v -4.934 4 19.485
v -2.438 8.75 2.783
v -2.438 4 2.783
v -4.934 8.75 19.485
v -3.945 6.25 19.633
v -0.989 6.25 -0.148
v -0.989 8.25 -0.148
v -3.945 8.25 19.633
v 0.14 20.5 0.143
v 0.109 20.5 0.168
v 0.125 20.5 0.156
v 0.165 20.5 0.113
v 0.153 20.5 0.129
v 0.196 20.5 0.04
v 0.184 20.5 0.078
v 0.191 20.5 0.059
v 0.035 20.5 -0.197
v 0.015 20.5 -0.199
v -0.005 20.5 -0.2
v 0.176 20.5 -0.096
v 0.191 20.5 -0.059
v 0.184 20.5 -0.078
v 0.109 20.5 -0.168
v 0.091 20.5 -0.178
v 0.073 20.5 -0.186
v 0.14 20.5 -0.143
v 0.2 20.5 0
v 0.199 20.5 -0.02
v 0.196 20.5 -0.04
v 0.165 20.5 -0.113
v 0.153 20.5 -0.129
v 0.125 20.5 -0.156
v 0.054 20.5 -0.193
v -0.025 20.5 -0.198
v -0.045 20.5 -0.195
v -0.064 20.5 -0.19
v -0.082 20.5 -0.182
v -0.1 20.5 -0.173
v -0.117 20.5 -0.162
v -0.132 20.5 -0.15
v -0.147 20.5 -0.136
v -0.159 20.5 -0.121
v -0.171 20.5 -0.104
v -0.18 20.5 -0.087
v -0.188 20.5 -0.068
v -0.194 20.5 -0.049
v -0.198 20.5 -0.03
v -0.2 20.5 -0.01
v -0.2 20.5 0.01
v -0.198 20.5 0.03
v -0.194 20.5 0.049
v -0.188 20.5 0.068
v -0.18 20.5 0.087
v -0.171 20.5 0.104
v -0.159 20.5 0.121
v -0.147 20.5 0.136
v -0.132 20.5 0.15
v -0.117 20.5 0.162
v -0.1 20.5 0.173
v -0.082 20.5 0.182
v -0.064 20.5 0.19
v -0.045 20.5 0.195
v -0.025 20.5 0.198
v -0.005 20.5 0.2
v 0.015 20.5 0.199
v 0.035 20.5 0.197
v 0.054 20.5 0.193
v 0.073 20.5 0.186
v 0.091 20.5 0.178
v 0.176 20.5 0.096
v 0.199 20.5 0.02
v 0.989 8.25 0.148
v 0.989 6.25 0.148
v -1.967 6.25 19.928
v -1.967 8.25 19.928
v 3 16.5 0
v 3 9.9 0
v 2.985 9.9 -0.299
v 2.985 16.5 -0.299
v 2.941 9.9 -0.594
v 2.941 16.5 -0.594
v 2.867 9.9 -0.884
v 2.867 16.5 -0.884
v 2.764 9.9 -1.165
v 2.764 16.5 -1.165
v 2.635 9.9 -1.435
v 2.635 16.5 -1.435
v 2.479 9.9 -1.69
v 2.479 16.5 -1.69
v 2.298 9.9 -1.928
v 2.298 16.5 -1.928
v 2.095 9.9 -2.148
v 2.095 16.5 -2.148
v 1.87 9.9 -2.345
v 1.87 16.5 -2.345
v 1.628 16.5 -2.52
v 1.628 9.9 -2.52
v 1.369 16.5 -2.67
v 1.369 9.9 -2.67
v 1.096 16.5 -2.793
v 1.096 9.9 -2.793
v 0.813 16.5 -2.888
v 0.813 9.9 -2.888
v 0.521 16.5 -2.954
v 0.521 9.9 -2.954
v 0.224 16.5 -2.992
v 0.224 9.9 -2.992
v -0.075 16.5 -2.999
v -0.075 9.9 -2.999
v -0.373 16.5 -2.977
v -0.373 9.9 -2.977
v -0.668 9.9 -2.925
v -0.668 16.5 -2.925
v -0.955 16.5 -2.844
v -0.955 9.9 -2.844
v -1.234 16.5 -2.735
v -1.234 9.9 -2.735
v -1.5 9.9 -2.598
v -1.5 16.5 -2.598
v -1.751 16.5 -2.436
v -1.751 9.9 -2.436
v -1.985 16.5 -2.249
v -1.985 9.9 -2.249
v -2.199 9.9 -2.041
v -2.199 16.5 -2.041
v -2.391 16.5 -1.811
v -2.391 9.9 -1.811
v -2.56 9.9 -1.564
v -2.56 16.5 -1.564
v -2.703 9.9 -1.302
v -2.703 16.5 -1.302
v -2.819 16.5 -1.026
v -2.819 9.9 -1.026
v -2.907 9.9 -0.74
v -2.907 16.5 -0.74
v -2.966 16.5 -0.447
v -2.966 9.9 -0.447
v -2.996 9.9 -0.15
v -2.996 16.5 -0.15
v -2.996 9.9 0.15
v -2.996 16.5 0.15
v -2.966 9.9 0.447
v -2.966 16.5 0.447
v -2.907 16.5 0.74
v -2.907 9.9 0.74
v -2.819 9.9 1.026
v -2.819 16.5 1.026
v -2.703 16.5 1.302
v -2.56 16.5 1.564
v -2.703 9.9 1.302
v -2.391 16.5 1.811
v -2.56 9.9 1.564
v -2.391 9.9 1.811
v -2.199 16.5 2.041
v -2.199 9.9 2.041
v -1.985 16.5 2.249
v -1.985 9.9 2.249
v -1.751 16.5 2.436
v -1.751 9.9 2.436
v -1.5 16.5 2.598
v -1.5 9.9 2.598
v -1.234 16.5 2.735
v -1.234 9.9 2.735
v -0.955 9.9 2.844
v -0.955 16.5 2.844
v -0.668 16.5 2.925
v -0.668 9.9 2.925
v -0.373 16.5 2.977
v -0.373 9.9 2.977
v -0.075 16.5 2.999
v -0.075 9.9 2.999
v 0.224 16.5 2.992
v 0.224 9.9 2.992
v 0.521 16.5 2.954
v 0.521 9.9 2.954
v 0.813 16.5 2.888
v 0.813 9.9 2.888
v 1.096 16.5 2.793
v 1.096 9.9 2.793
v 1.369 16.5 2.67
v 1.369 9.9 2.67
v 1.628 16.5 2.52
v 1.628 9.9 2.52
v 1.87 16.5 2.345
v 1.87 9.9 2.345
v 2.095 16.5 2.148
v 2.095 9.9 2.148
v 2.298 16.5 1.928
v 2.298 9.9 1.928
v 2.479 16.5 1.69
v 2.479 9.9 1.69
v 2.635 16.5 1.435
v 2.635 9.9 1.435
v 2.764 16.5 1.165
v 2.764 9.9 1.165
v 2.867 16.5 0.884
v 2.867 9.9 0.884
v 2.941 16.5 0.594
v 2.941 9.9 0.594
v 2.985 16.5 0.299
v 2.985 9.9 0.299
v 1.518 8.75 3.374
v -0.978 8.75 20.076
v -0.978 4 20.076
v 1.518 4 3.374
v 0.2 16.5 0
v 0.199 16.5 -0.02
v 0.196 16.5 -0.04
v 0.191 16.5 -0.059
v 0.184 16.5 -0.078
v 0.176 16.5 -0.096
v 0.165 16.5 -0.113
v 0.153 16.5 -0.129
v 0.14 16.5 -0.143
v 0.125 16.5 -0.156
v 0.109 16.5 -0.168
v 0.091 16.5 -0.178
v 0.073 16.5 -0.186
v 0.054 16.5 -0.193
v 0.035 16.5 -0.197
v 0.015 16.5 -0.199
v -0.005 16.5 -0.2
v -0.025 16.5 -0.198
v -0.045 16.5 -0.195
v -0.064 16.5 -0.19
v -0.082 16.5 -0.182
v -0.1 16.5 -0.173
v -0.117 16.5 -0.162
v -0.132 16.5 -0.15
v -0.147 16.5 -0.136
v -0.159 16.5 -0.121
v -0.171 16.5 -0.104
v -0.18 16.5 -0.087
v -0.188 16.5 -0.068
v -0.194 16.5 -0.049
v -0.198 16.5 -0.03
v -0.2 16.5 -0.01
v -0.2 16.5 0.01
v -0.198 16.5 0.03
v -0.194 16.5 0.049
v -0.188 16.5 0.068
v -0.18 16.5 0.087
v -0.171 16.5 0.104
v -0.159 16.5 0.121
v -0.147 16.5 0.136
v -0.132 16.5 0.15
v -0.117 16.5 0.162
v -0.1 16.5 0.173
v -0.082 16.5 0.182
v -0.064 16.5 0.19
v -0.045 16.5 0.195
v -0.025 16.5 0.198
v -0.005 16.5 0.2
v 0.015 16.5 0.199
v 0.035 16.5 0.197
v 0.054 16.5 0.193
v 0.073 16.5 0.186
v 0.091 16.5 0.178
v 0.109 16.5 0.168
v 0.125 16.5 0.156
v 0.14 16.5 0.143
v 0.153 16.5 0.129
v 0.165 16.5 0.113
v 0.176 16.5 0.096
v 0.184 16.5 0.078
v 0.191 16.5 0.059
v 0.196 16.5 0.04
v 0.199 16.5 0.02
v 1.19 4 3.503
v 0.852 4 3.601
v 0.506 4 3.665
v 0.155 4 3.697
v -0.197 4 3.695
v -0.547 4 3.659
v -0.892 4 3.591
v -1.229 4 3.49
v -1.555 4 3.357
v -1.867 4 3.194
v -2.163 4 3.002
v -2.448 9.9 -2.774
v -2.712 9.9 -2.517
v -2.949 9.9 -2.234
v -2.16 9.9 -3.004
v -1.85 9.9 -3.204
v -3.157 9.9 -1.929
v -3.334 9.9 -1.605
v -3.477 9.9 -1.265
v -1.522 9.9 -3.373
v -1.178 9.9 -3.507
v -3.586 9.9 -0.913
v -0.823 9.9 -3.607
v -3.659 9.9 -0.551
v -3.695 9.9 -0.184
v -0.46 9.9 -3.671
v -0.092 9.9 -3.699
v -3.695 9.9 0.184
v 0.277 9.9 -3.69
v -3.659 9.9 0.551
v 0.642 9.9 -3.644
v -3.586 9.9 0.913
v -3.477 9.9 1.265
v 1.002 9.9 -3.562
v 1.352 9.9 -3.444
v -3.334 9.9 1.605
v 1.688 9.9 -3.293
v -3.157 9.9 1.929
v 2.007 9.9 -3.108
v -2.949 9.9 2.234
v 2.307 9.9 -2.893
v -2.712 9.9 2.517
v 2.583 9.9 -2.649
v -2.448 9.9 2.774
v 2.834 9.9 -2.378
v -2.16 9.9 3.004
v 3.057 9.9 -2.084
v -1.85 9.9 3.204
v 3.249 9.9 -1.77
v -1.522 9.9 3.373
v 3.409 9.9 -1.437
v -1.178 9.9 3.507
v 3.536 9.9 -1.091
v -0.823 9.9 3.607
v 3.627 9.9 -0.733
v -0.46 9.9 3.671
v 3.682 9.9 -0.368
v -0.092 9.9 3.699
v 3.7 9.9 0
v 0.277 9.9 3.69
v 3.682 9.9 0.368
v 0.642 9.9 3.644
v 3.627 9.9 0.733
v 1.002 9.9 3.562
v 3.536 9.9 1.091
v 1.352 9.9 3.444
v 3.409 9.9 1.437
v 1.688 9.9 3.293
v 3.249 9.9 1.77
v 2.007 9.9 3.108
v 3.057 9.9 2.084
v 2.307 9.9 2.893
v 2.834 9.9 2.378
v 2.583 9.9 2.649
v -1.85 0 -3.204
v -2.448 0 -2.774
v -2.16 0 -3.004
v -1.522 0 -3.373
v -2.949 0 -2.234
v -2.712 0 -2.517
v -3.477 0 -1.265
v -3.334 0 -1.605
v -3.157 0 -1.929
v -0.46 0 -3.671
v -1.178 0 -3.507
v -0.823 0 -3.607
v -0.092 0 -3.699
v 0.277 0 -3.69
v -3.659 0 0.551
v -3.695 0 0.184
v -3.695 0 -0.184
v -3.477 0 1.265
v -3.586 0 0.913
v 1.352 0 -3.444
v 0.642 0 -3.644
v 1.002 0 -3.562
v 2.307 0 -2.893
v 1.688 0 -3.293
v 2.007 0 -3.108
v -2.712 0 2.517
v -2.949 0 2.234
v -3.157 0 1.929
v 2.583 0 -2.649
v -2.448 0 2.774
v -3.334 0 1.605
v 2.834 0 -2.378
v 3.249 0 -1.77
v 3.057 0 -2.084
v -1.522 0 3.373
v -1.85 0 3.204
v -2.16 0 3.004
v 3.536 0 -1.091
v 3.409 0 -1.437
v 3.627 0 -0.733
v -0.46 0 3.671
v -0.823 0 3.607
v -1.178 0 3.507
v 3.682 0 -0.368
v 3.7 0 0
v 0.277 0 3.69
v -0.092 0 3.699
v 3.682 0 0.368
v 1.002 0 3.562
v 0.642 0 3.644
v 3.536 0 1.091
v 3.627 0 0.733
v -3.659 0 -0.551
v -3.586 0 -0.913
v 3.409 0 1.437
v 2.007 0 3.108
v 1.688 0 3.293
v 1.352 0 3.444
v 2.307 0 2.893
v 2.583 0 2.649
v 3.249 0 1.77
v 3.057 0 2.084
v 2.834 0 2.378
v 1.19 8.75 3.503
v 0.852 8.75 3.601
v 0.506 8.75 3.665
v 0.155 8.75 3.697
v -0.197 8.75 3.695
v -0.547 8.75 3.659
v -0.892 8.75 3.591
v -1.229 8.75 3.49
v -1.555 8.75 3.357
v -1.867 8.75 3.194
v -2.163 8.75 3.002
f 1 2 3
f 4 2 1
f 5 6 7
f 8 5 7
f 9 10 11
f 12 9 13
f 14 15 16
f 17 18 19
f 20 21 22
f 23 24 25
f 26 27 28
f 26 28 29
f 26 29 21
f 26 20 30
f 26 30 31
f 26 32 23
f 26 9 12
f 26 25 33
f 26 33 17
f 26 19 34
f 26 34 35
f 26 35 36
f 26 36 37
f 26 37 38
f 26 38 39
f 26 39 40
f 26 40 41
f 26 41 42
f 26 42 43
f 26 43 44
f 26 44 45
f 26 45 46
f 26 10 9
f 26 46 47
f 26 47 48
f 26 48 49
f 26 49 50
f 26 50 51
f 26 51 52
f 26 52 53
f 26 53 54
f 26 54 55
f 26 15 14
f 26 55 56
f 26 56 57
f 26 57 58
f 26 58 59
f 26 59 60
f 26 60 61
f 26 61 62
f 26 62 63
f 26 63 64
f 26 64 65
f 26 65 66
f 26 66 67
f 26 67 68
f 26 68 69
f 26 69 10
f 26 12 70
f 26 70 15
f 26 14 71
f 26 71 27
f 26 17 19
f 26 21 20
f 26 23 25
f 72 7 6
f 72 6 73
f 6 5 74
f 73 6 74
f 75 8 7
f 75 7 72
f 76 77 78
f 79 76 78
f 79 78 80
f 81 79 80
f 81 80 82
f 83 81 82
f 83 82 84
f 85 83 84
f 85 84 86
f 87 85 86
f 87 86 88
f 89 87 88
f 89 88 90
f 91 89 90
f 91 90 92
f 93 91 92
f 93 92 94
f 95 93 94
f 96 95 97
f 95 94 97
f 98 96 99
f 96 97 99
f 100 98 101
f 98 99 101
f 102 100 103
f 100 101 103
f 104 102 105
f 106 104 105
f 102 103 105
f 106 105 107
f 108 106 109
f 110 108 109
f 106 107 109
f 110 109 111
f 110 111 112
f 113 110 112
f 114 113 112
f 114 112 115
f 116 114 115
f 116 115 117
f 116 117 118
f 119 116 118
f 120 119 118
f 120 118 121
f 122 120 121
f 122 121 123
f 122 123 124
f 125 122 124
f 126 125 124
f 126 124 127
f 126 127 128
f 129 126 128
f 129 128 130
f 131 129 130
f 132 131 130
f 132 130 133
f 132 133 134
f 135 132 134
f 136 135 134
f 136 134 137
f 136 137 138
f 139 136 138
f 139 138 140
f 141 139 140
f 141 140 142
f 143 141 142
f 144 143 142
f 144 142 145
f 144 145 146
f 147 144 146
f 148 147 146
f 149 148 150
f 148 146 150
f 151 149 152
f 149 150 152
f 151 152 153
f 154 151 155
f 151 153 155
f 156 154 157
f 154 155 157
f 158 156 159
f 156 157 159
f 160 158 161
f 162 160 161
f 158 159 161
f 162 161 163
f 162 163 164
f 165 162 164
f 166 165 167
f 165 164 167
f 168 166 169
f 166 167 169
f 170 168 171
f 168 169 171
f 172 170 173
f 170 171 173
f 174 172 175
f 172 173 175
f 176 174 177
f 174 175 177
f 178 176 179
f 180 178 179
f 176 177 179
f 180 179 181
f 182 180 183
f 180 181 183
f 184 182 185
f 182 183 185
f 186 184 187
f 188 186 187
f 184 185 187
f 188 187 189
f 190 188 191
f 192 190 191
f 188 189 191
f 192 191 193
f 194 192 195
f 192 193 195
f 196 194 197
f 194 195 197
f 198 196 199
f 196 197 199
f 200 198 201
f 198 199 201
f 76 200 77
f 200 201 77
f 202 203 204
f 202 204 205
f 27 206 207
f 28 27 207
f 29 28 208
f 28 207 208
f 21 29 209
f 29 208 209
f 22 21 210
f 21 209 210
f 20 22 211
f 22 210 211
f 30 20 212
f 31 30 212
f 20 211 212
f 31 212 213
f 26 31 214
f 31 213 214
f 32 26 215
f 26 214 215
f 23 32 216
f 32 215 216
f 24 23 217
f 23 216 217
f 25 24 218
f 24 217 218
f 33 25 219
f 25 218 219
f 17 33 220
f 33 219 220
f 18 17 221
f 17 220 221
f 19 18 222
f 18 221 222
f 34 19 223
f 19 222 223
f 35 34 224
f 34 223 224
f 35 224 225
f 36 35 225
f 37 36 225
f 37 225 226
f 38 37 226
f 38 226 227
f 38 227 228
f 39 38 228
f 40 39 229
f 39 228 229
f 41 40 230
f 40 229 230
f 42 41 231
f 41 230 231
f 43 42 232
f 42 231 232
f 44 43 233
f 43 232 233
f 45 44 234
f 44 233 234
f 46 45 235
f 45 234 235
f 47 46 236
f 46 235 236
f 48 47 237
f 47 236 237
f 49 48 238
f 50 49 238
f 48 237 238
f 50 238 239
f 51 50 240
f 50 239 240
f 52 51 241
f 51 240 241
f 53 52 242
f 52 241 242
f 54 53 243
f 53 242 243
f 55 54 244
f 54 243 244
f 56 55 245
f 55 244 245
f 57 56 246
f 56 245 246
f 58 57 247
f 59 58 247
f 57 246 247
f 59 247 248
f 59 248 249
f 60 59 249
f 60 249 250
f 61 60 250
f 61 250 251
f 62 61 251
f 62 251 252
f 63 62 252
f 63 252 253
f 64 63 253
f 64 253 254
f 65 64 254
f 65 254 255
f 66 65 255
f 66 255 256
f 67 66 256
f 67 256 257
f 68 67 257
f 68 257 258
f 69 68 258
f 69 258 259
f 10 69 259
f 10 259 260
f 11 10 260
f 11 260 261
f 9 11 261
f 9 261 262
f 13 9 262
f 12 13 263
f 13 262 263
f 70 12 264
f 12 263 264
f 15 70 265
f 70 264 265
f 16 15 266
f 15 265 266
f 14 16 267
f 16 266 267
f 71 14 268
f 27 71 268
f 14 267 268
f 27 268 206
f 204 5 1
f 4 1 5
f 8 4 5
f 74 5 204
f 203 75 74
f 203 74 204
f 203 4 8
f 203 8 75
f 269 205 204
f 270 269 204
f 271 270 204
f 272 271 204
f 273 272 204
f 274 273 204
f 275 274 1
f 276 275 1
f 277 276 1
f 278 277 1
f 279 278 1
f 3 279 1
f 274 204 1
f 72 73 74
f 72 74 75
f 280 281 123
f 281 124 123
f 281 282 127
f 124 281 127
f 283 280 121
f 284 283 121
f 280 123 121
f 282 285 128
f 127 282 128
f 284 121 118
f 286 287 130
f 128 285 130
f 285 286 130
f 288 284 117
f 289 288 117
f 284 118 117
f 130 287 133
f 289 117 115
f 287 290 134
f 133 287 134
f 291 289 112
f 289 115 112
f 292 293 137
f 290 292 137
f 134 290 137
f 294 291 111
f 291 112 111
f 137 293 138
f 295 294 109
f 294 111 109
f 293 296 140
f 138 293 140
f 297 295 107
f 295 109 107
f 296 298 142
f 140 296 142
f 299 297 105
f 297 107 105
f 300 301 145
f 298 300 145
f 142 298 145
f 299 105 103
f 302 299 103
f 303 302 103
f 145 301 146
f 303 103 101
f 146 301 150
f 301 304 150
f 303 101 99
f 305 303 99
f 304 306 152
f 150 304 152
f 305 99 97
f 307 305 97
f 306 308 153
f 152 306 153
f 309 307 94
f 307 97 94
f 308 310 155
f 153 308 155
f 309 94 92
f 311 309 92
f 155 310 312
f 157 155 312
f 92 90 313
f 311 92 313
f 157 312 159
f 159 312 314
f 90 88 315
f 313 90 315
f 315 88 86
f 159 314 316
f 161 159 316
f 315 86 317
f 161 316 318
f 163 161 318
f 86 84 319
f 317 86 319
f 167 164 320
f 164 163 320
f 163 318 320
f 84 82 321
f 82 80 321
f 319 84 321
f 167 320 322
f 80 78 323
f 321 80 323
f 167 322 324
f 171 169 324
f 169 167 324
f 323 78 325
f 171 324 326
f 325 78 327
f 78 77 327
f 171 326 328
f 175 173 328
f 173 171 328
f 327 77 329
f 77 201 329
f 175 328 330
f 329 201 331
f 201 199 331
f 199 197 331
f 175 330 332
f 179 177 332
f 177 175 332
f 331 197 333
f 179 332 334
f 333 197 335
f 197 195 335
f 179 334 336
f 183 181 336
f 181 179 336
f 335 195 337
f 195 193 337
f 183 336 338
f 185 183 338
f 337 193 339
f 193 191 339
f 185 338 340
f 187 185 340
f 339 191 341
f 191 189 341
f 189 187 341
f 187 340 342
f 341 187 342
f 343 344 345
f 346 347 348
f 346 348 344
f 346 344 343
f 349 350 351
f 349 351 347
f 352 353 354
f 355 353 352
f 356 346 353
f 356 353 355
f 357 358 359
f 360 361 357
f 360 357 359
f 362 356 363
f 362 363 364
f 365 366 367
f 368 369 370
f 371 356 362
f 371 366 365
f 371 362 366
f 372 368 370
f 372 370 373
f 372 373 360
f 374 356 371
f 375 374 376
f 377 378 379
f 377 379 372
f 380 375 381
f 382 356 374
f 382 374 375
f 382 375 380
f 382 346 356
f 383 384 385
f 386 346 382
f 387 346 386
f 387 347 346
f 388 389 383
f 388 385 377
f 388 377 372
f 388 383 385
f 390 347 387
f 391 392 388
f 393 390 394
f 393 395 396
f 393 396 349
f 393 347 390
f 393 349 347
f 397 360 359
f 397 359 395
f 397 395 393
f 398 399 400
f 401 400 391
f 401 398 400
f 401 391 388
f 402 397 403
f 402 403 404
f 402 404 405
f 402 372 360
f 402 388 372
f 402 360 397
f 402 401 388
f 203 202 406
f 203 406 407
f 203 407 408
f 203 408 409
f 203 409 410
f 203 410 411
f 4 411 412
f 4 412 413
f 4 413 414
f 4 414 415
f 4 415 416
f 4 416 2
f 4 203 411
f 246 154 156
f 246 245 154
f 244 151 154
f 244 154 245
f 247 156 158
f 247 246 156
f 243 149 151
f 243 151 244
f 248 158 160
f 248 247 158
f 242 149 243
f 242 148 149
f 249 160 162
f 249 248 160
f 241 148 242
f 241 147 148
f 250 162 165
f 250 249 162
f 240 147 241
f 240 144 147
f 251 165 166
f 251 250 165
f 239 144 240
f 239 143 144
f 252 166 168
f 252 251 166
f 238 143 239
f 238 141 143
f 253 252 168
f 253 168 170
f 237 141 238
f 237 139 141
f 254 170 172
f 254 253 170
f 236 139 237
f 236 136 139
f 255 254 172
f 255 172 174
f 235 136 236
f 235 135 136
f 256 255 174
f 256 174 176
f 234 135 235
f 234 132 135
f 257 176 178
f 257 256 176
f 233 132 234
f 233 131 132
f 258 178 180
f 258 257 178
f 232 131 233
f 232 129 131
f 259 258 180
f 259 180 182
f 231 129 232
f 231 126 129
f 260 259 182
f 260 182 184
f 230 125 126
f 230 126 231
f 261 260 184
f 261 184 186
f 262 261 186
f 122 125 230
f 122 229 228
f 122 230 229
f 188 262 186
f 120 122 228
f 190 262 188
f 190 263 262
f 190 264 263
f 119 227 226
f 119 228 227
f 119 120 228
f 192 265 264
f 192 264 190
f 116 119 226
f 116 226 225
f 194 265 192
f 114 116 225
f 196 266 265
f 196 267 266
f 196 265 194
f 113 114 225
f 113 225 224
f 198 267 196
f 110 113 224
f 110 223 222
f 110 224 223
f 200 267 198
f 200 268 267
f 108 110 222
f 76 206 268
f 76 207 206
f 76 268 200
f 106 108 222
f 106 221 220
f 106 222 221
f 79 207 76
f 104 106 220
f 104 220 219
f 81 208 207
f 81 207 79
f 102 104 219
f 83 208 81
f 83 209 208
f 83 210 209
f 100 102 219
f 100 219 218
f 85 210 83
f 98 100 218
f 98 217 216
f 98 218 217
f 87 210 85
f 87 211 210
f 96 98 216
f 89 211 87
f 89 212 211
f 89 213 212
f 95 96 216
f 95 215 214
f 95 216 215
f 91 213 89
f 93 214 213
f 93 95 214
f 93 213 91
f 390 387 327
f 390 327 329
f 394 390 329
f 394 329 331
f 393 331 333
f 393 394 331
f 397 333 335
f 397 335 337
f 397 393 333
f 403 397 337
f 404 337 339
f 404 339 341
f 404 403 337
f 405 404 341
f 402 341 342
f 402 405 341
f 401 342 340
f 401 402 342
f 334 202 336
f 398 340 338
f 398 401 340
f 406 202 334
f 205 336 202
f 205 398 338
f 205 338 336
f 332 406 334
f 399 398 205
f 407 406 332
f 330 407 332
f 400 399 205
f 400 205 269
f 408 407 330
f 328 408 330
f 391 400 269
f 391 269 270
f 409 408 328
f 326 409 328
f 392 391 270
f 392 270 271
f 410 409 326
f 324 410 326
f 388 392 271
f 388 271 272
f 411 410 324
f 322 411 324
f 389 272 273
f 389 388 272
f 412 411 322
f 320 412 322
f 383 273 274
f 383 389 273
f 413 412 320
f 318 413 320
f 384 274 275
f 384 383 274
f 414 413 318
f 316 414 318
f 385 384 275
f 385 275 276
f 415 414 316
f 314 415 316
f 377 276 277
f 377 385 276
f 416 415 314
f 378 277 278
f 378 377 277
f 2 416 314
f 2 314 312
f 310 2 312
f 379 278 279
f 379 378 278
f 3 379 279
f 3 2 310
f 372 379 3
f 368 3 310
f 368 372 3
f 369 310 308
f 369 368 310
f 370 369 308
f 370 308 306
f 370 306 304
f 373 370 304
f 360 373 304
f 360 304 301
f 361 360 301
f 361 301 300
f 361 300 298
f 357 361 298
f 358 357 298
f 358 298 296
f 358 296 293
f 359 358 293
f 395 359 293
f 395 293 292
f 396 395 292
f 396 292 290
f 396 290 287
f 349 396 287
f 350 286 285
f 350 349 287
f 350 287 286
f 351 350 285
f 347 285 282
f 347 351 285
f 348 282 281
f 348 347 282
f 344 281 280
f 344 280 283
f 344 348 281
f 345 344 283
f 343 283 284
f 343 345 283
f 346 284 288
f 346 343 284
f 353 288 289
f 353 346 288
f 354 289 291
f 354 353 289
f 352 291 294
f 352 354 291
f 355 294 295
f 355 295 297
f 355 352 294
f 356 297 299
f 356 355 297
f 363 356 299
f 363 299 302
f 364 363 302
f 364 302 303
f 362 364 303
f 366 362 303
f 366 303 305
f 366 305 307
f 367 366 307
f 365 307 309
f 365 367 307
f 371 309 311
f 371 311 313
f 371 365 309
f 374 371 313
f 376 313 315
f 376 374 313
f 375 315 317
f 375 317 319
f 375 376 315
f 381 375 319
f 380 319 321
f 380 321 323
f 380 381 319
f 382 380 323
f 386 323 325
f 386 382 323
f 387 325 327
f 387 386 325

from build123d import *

# Parameters (mm, degrees)
SKETCH1_R           = 3
BOSS_EXTRUDE1_DEPTH = 16.5
SKETCH2_R           = 3.7
BOSS_EXTRUDE2_DEPTH = 9.9
BOSS_EXTRUDE3_START = -8.75
BOSS_EXTRUDE3_DEPTH = 4.75
SKETCH4_R           = 0.2
BOSS_EXTRUDE4_DEPTH = 4
SKETCH5_W           = 2
SKETCH5_H           = 2
CUT_EXTRUDE1_DEPTH  = 20


with BuildPart() as part:
    # Sketch1 → Boss-Extrude1 (new body)
    with BuildSketch(Plane(origin=(0, 0, 0), x_dir=(1, 0, 0), z_dir=(0, 1, 0))):
        Circle(SKETCH1_R)
    extrude(amount=BOSS_EXTRUDE1_DEPTH)

    # Sketch2 → Boss-Extrude2 (add)
    with BuildSketch(Plane.XZ):
        Circle(SKETCH2_R)
    extrude(amount=-BOSS_EXTRUDE2_DEPTH)

    # Sketch3 → Boss-Extrude3 (add)
    with BuildSketch(Plane.XZ.offset(BOSS_EXTRUDE3_START)):
        with BuildLine():
            Line((-2.438116725, 2.783089441), (-4.934027826, 19.484747096))
            Line((-4.934027826, 19.484747096), (-0.977958543, 20.075945733))
            Line((-0.977958543, 20.075945733), (1.517952558, 3.374288078))
            ThreePointArc((1.517952558, 3.374288078), (-0.546858739, 3.659364087), (-2.438116725, 2.783089441))
        make_face()
    extrude(amount=BOSS_EXTRUDE3_DEPTH)

    # Sketch4 → Boss-Extrude4 (add)
    with BuildSketch(Plane(origin=(0, 16.5, 0), x_dir=(1, 0, 0), z_dir=(0, 1, 0))):
        Circle(SKETCH4_R)
    extrude(amount=BOSS_EXTRUDE4_DEPTH)

    # Sketch5 → Cut-Extrude1 (cut)
    with BuildSketch(Plane(origin=(-2.955993184, 0, 19.780346415), x_dir=(0.989017321, 0, 0.147799659), z_dir=(-0.147799659, 0, 0.989017321))):
        with Locations((0, 7.25)):
            Rectangle(SKETCH5_W, SKETCH5_H)
    extrude(amount=-CUT_EXTRUDE1_DEPTH, mode=Mode.SUBTRACT)


solid = part.part
